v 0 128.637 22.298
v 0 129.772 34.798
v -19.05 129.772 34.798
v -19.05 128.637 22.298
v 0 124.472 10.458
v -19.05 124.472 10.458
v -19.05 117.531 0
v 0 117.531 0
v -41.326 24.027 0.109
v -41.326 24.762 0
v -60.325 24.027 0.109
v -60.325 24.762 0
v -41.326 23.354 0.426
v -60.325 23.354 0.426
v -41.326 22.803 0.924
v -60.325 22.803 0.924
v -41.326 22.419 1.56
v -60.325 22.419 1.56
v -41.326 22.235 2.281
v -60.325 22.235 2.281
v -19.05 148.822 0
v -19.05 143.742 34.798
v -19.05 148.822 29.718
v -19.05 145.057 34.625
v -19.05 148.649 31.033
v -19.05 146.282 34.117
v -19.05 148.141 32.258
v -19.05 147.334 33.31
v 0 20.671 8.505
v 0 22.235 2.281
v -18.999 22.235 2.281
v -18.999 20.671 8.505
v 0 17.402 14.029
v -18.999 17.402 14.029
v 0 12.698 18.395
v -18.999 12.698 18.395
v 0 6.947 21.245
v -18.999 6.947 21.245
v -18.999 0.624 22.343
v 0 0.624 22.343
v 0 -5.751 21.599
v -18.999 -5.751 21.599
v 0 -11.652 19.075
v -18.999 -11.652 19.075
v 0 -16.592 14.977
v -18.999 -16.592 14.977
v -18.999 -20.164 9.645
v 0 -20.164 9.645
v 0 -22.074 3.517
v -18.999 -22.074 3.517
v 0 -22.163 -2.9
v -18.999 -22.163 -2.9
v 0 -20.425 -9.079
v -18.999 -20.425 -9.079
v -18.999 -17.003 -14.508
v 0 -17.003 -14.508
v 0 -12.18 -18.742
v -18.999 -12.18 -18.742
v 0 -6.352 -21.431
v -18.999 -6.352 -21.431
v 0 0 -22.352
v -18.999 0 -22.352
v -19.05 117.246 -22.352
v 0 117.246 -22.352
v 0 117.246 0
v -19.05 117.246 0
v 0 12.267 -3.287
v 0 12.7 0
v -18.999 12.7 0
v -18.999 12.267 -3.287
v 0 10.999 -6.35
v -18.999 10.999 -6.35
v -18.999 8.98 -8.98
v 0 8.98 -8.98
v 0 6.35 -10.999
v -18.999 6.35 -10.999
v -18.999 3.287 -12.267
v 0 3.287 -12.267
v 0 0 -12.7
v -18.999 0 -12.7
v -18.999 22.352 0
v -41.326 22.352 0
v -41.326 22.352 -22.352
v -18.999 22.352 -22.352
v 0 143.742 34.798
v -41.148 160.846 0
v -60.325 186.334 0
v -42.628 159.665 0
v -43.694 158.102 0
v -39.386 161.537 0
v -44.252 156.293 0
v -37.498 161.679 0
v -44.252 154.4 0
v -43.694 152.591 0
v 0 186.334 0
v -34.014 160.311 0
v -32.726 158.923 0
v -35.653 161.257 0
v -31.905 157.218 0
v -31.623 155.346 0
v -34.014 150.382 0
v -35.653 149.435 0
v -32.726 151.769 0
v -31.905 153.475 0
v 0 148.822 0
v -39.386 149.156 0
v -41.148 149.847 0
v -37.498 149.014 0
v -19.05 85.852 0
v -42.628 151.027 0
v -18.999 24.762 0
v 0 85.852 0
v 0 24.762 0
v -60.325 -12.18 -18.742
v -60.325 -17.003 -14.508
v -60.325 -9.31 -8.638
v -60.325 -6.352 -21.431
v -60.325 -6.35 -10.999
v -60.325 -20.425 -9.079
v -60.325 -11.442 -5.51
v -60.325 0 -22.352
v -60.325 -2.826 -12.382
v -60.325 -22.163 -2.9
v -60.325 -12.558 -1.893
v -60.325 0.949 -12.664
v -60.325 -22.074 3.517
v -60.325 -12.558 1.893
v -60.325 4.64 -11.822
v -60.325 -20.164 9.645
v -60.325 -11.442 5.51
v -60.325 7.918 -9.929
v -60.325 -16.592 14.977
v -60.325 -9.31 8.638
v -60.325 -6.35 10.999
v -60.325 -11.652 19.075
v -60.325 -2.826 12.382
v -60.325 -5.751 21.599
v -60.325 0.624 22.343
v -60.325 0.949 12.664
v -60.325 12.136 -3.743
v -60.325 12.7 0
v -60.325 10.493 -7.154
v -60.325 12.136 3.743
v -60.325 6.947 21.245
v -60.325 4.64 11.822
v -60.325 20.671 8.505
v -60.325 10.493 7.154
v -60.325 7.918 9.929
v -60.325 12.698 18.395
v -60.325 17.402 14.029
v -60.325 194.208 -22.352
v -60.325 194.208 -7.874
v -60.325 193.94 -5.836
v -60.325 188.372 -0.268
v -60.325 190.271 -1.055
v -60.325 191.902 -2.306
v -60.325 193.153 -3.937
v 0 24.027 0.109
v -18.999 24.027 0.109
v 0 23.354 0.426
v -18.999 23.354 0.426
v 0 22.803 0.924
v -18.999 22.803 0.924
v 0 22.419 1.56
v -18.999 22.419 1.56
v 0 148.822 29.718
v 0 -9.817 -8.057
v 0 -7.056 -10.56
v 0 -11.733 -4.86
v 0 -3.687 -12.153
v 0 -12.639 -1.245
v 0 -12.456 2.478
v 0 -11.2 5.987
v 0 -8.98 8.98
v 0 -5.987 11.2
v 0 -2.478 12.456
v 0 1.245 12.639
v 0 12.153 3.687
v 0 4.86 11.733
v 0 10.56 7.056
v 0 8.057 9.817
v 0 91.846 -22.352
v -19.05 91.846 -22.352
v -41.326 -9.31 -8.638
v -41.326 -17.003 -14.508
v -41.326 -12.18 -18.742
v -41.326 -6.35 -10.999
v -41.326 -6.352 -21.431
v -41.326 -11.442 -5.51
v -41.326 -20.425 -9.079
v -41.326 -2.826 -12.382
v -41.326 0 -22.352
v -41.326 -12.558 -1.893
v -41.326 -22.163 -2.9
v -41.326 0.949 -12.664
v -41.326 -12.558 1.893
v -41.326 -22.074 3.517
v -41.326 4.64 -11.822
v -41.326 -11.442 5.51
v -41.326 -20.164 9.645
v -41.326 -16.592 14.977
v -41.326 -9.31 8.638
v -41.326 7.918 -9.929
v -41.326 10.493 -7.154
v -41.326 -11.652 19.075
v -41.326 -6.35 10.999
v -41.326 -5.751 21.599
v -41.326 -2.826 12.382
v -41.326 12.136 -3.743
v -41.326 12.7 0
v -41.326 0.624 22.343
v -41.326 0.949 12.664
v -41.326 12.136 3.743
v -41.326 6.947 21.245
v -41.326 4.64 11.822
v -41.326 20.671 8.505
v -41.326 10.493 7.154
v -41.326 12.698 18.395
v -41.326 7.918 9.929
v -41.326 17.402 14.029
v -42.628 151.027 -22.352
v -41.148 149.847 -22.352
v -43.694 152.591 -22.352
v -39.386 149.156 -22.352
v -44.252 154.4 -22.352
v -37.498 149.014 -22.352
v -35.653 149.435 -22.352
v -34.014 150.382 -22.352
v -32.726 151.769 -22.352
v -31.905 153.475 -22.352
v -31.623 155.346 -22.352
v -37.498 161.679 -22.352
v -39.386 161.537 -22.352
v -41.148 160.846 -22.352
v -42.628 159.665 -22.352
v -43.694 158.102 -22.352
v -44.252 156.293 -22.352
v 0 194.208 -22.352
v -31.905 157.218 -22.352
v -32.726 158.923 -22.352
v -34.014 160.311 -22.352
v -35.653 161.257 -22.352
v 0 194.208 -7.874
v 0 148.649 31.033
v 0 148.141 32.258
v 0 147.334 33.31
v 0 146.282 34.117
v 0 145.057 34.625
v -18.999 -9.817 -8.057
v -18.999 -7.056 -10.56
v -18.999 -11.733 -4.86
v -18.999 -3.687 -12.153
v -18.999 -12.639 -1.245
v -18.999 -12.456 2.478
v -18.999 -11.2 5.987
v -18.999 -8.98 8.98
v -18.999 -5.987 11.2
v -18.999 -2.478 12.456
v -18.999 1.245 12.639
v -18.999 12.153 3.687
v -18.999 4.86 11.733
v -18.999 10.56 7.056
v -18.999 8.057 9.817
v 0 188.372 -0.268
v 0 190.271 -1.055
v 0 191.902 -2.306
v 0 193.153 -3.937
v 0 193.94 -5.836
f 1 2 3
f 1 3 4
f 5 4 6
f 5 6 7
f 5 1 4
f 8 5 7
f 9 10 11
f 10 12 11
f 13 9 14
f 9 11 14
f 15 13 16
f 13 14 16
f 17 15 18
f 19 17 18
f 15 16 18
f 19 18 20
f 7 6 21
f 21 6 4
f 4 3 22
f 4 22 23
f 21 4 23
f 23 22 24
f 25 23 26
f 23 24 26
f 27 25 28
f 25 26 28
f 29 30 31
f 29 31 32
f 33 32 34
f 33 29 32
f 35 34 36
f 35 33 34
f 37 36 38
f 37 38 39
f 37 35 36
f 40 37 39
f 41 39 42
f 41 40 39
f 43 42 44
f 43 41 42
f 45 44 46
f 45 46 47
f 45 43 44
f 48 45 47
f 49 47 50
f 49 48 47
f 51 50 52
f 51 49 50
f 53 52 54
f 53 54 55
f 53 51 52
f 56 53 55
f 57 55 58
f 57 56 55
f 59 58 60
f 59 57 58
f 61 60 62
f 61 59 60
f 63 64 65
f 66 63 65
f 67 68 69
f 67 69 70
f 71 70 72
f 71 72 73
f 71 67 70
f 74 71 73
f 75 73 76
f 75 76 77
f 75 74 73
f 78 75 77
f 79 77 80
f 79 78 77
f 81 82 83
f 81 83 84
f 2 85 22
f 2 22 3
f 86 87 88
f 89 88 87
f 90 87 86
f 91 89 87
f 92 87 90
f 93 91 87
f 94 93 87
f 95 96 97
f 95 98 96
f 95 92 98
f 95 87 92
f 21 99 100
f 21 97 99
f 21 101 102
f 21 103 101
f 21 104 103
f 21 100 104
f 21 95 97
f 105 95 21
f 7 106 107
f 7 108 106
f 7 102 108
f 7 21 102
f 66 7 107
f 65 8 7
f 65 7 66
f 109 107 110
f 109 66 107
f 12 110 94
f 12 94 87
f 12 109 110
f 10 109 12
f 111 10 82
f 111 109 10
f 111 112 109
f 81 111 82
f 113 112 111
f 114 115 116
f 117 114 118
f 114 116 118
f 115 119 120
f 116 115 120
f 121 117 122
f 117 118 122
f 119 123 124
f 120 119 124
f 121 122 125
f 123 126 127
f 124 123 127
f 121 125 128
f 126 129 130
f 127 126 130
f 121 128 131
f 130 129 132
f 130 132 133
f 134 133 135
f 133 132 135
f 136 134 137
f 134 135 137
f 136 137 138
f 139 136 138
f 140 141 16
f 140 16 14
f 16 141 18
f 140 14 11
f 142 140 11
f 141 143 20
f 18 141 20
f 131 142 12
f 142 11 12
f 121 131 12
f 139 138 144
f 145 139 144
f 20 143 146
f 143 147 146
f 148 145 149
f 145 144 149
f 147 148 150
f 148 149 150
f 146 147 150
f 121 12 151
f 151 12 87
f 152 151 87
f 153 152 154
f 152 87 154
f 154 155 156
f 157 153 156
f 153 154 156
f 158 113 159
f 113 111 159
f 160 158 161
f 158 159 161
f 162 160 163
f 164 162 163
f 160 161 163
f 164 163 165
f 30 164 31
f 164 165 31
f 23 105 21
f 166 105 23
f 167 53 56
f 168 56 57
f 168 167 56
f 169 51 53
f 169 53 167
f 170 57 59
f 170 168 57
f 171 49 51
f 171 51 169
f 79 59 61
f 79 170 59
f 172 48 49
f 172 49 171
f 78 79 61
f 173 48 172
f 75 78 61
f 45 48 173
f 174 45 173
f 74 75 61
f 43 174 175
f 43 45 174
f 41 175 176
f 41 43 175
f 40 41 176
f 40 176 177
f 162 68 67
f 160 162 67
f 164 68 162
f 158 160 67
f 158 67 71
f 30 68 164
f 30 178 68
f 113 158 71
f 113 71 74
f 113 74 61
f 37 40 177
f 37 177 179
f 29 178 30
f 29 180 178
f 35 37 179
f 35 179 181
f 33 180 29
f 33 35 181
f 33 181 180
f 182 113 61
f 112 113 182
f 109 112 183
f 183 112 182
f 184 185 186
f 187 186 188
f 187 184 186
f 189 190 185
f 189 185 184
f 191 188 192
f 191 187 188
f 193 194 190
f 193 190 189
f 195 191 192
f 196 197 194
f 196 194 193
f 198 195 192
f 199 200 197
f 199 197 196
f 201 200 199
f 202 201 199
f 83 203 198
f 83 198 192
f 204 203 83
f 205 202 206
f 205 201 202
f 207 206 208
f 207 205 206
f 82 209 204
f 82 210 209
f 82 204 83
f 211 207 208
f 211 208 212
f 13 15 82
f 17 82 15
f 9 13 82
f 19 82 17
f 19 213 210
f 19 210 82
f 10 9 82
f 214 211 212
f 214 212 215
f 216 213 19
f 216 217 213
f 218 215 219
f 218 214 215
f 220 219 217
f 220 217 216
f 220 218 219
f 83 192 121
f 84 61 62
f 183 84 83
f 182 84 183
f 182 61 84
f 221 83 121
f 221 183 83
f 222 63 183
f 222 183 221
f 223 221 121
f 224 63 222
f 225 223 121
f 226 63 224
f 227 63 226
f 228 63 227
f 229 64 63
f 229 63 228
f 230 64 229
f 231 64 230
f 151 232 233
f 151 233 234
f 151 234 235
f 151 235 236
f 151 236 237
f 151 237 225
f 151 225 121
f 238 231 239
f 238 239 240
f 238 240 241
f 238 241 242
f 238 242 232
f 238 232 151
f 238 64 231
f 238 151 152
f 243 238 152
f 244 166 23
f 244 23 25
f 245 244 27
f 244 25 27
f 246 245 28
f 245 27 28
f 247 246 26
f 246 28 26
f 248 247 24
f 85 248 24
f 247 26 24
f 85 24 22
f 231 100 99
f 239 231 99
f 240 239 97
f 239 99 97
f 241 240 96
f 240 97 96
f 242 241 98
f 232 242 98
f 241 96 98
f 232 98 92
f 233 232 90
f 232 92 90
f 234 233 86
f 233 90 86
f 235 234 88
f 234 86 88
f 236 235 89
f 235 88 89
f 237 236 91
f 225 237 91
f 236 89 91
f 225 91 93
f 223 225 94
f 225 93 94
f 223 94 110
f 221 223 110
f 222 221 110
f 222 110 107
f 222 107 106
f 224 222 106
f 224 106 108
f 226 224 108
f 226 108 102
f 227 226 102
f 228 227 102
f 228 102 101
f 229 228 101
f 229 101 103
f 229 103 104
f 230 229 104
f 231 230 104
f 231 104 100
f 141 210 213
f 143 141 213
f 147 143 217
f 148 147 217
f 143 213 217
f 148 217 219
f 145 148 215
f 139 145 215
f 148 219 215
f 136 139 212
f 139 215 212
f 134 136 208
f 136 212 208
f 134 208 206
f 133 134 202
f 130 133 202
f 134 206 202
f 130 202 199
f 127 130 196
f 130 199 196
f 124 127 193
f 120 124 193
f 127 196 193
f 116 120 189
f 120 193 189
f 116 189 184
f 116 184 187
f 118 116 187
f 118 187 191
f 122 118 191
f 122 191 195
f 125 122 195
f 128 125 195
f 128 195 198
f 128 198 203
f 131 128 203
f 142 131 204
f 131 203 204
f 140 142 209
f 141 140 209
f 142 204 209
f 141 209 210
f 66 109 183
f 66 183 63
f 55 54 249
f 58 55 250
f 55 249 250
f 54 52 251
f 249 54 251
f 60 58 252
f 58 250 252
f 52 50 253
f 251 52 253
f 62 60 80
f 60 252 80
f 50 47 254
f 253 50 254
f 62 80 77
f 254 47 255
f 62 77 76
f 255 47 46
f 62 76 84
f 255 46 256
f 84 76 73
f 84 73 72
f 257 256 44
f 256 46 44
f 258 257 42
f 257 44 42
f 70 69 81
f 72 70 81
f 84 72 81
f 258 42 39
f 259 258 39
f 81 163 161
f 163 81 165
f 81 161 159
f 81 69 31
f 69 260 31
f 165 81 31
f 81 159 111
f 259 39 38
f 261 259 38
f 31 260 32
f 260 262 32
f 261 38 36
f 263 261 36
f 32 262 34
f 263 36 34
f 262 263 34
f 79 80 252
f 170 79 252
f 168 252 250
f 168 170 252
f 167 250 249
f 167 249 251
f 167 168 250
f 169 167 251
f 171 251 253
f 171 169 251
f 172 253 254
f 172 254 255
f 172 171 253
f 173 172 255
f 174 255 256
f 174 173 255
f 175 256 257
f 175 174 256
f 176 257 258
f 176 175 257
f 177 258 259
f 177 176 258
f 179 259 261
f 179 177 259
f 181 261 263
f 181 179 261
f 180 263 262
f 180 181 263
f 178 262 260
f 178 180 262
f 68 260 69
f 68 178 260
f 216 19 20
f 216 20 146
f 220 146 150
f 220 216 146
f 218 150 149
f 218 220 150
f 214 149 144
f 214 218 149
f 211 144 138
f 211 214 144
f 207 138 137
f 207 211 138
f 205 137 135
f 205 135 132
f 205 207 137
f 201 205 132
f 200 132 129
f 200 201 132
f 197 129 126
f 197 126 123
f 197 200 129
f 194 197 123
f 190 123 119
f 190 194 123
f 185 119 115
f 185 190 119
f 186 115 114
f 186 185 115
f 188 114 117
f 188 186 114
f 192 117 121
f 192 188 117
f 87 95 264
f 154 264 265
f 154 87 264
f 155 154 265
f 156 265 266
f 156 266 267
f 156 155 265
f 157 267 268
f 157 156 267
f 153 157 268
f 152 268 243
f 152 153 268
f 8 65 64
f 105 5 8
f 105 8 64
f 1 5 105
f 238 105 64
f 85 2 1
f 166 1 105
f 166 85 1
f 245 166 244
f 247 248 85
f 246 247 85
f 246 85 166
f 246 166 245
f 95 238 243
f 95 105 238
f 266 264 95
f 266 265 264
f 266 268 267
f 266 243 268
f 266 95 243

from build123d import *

# Parameters (mm, degrees)
F1_DEPTH  = 18.9992
F2_W      = 22.3266
F2_H      = 171.8564
F3_DEPTH  = 22.352
F5_R      = 12.7
F6_DEPTH  = 18.9992
F8_DEPTH  = 19.05
F10_DEPTH = 19.05
F11_R     = 6.35
F12_DEPTH = 22.353
F13_R     = 5.08
F14_R     = 7.874
F15_R     = 2.54


with BuildPart() as f1:
    # F0 (on Right) → F1 (new body)
    with BuildSketch(Plane.YZ):
        with BuildLine():
            ThreePointArc((22.352, 0), (-15.805251, 15.805251), (0, -22.352))
            Line((0, -22.352), (194.2084, -22.352))
            Line((194.2084, -22.352), (194.2084, 0))
            Line((194.2084, 0), (22.352, 0))
        make_face()
        with BuildLine():
            ThreePointArc((0, -12.7), (-8.980256, 8.980256), (12.7, 0))
            ThreePointArc((12.7, 0), (8.980256, -8.980256), (0, -12.7))
        make_face(mode=Mode.SUBTRACT)
    extrude(amount=-F1_DEPTH)

    # F2 (on Top) → F3 (join)
    with BuildSketch(Plane.XY):
        with Locations((-30.1625, 108.2802)):
            Rectangle(F2_W, F2_H)
    extrude(amount=-F3_DEPTH)

    # F5 (on offset) → F6 (join)
    with BuildSketch(Plane.YZ.offset(-41.3258)):
        with BuildLine():
            Line((194.2084, 0), (22.352, 0))
            ThreePointArc((22.352, 0), (-15.805251, 15.805251), (0, -22.352))
            Line((0, -22.352), (194.2084, -22.352))
            Line((194.2084, -22.352), (194.2084, 0))
        make_face()
        Circle(F5_R, mode=Mode.SUBTRACT)
    extrude(amount=-F6_DEPTH)

    # F7 (on Right) → F8 (cut)
    with BuildSketch(Plane.YZ):
        Polygon((117.2464, 0), (85.852, 0), (91.8464, -22.352), (117.2464, -22.352), align=None)
    extrude(amount=-F8_DEPTH, mode=Mode.SUBTRACT)

    # F9 (on Right) → F10 (join)
    with BuildSketch(Plane.YZ):
        with BuildLine():
            ThreePointArc((129.771803, 34.798), (126.921409, 16.24865), (117.530748, 0))
            Line((117.530748, 0), (148.821803, 0))
            Line((148.821803, 0), (148.821803, 34.798))
            Line((148.821803, 34.798), (129.771803, 34.798))
        make_face()
    extrude(amount=-F10_DEPTH)

    # F11 (on face) → F12 (cut, through all)
    with BuildSketch(Plane.XY):
        with Locations((-37.973, 155.3464)):
            Circle(F11_R)
    extrude(amount=-F12_DEPTH, mode=Mode.SUBTRACT)

    # F13
    f13_edges = [f1.edges().sort_by_distance(p)[0] for p in [
        (-9.525, 148.821803, 34.798),
    ]]
    fillet(f13_edges, radius=F13_R)

    # F14
    f14_edges = [f1.edges().sort_by_distance(p)[0] for p in [
        (-30.1625, 194.2084, 0),
    ]]
    fillet(f14_edges, radius=F14_R)

    # F15
    f15_edges = [f1.edges().sort_by_distance(p)[0] for p in [
        (-9.4996, 22.352, 0),
        (-50.8254, 22.352, 0),
    ]]
    fillet(f15_edges, radius=F15_R)


solid = f1.part
